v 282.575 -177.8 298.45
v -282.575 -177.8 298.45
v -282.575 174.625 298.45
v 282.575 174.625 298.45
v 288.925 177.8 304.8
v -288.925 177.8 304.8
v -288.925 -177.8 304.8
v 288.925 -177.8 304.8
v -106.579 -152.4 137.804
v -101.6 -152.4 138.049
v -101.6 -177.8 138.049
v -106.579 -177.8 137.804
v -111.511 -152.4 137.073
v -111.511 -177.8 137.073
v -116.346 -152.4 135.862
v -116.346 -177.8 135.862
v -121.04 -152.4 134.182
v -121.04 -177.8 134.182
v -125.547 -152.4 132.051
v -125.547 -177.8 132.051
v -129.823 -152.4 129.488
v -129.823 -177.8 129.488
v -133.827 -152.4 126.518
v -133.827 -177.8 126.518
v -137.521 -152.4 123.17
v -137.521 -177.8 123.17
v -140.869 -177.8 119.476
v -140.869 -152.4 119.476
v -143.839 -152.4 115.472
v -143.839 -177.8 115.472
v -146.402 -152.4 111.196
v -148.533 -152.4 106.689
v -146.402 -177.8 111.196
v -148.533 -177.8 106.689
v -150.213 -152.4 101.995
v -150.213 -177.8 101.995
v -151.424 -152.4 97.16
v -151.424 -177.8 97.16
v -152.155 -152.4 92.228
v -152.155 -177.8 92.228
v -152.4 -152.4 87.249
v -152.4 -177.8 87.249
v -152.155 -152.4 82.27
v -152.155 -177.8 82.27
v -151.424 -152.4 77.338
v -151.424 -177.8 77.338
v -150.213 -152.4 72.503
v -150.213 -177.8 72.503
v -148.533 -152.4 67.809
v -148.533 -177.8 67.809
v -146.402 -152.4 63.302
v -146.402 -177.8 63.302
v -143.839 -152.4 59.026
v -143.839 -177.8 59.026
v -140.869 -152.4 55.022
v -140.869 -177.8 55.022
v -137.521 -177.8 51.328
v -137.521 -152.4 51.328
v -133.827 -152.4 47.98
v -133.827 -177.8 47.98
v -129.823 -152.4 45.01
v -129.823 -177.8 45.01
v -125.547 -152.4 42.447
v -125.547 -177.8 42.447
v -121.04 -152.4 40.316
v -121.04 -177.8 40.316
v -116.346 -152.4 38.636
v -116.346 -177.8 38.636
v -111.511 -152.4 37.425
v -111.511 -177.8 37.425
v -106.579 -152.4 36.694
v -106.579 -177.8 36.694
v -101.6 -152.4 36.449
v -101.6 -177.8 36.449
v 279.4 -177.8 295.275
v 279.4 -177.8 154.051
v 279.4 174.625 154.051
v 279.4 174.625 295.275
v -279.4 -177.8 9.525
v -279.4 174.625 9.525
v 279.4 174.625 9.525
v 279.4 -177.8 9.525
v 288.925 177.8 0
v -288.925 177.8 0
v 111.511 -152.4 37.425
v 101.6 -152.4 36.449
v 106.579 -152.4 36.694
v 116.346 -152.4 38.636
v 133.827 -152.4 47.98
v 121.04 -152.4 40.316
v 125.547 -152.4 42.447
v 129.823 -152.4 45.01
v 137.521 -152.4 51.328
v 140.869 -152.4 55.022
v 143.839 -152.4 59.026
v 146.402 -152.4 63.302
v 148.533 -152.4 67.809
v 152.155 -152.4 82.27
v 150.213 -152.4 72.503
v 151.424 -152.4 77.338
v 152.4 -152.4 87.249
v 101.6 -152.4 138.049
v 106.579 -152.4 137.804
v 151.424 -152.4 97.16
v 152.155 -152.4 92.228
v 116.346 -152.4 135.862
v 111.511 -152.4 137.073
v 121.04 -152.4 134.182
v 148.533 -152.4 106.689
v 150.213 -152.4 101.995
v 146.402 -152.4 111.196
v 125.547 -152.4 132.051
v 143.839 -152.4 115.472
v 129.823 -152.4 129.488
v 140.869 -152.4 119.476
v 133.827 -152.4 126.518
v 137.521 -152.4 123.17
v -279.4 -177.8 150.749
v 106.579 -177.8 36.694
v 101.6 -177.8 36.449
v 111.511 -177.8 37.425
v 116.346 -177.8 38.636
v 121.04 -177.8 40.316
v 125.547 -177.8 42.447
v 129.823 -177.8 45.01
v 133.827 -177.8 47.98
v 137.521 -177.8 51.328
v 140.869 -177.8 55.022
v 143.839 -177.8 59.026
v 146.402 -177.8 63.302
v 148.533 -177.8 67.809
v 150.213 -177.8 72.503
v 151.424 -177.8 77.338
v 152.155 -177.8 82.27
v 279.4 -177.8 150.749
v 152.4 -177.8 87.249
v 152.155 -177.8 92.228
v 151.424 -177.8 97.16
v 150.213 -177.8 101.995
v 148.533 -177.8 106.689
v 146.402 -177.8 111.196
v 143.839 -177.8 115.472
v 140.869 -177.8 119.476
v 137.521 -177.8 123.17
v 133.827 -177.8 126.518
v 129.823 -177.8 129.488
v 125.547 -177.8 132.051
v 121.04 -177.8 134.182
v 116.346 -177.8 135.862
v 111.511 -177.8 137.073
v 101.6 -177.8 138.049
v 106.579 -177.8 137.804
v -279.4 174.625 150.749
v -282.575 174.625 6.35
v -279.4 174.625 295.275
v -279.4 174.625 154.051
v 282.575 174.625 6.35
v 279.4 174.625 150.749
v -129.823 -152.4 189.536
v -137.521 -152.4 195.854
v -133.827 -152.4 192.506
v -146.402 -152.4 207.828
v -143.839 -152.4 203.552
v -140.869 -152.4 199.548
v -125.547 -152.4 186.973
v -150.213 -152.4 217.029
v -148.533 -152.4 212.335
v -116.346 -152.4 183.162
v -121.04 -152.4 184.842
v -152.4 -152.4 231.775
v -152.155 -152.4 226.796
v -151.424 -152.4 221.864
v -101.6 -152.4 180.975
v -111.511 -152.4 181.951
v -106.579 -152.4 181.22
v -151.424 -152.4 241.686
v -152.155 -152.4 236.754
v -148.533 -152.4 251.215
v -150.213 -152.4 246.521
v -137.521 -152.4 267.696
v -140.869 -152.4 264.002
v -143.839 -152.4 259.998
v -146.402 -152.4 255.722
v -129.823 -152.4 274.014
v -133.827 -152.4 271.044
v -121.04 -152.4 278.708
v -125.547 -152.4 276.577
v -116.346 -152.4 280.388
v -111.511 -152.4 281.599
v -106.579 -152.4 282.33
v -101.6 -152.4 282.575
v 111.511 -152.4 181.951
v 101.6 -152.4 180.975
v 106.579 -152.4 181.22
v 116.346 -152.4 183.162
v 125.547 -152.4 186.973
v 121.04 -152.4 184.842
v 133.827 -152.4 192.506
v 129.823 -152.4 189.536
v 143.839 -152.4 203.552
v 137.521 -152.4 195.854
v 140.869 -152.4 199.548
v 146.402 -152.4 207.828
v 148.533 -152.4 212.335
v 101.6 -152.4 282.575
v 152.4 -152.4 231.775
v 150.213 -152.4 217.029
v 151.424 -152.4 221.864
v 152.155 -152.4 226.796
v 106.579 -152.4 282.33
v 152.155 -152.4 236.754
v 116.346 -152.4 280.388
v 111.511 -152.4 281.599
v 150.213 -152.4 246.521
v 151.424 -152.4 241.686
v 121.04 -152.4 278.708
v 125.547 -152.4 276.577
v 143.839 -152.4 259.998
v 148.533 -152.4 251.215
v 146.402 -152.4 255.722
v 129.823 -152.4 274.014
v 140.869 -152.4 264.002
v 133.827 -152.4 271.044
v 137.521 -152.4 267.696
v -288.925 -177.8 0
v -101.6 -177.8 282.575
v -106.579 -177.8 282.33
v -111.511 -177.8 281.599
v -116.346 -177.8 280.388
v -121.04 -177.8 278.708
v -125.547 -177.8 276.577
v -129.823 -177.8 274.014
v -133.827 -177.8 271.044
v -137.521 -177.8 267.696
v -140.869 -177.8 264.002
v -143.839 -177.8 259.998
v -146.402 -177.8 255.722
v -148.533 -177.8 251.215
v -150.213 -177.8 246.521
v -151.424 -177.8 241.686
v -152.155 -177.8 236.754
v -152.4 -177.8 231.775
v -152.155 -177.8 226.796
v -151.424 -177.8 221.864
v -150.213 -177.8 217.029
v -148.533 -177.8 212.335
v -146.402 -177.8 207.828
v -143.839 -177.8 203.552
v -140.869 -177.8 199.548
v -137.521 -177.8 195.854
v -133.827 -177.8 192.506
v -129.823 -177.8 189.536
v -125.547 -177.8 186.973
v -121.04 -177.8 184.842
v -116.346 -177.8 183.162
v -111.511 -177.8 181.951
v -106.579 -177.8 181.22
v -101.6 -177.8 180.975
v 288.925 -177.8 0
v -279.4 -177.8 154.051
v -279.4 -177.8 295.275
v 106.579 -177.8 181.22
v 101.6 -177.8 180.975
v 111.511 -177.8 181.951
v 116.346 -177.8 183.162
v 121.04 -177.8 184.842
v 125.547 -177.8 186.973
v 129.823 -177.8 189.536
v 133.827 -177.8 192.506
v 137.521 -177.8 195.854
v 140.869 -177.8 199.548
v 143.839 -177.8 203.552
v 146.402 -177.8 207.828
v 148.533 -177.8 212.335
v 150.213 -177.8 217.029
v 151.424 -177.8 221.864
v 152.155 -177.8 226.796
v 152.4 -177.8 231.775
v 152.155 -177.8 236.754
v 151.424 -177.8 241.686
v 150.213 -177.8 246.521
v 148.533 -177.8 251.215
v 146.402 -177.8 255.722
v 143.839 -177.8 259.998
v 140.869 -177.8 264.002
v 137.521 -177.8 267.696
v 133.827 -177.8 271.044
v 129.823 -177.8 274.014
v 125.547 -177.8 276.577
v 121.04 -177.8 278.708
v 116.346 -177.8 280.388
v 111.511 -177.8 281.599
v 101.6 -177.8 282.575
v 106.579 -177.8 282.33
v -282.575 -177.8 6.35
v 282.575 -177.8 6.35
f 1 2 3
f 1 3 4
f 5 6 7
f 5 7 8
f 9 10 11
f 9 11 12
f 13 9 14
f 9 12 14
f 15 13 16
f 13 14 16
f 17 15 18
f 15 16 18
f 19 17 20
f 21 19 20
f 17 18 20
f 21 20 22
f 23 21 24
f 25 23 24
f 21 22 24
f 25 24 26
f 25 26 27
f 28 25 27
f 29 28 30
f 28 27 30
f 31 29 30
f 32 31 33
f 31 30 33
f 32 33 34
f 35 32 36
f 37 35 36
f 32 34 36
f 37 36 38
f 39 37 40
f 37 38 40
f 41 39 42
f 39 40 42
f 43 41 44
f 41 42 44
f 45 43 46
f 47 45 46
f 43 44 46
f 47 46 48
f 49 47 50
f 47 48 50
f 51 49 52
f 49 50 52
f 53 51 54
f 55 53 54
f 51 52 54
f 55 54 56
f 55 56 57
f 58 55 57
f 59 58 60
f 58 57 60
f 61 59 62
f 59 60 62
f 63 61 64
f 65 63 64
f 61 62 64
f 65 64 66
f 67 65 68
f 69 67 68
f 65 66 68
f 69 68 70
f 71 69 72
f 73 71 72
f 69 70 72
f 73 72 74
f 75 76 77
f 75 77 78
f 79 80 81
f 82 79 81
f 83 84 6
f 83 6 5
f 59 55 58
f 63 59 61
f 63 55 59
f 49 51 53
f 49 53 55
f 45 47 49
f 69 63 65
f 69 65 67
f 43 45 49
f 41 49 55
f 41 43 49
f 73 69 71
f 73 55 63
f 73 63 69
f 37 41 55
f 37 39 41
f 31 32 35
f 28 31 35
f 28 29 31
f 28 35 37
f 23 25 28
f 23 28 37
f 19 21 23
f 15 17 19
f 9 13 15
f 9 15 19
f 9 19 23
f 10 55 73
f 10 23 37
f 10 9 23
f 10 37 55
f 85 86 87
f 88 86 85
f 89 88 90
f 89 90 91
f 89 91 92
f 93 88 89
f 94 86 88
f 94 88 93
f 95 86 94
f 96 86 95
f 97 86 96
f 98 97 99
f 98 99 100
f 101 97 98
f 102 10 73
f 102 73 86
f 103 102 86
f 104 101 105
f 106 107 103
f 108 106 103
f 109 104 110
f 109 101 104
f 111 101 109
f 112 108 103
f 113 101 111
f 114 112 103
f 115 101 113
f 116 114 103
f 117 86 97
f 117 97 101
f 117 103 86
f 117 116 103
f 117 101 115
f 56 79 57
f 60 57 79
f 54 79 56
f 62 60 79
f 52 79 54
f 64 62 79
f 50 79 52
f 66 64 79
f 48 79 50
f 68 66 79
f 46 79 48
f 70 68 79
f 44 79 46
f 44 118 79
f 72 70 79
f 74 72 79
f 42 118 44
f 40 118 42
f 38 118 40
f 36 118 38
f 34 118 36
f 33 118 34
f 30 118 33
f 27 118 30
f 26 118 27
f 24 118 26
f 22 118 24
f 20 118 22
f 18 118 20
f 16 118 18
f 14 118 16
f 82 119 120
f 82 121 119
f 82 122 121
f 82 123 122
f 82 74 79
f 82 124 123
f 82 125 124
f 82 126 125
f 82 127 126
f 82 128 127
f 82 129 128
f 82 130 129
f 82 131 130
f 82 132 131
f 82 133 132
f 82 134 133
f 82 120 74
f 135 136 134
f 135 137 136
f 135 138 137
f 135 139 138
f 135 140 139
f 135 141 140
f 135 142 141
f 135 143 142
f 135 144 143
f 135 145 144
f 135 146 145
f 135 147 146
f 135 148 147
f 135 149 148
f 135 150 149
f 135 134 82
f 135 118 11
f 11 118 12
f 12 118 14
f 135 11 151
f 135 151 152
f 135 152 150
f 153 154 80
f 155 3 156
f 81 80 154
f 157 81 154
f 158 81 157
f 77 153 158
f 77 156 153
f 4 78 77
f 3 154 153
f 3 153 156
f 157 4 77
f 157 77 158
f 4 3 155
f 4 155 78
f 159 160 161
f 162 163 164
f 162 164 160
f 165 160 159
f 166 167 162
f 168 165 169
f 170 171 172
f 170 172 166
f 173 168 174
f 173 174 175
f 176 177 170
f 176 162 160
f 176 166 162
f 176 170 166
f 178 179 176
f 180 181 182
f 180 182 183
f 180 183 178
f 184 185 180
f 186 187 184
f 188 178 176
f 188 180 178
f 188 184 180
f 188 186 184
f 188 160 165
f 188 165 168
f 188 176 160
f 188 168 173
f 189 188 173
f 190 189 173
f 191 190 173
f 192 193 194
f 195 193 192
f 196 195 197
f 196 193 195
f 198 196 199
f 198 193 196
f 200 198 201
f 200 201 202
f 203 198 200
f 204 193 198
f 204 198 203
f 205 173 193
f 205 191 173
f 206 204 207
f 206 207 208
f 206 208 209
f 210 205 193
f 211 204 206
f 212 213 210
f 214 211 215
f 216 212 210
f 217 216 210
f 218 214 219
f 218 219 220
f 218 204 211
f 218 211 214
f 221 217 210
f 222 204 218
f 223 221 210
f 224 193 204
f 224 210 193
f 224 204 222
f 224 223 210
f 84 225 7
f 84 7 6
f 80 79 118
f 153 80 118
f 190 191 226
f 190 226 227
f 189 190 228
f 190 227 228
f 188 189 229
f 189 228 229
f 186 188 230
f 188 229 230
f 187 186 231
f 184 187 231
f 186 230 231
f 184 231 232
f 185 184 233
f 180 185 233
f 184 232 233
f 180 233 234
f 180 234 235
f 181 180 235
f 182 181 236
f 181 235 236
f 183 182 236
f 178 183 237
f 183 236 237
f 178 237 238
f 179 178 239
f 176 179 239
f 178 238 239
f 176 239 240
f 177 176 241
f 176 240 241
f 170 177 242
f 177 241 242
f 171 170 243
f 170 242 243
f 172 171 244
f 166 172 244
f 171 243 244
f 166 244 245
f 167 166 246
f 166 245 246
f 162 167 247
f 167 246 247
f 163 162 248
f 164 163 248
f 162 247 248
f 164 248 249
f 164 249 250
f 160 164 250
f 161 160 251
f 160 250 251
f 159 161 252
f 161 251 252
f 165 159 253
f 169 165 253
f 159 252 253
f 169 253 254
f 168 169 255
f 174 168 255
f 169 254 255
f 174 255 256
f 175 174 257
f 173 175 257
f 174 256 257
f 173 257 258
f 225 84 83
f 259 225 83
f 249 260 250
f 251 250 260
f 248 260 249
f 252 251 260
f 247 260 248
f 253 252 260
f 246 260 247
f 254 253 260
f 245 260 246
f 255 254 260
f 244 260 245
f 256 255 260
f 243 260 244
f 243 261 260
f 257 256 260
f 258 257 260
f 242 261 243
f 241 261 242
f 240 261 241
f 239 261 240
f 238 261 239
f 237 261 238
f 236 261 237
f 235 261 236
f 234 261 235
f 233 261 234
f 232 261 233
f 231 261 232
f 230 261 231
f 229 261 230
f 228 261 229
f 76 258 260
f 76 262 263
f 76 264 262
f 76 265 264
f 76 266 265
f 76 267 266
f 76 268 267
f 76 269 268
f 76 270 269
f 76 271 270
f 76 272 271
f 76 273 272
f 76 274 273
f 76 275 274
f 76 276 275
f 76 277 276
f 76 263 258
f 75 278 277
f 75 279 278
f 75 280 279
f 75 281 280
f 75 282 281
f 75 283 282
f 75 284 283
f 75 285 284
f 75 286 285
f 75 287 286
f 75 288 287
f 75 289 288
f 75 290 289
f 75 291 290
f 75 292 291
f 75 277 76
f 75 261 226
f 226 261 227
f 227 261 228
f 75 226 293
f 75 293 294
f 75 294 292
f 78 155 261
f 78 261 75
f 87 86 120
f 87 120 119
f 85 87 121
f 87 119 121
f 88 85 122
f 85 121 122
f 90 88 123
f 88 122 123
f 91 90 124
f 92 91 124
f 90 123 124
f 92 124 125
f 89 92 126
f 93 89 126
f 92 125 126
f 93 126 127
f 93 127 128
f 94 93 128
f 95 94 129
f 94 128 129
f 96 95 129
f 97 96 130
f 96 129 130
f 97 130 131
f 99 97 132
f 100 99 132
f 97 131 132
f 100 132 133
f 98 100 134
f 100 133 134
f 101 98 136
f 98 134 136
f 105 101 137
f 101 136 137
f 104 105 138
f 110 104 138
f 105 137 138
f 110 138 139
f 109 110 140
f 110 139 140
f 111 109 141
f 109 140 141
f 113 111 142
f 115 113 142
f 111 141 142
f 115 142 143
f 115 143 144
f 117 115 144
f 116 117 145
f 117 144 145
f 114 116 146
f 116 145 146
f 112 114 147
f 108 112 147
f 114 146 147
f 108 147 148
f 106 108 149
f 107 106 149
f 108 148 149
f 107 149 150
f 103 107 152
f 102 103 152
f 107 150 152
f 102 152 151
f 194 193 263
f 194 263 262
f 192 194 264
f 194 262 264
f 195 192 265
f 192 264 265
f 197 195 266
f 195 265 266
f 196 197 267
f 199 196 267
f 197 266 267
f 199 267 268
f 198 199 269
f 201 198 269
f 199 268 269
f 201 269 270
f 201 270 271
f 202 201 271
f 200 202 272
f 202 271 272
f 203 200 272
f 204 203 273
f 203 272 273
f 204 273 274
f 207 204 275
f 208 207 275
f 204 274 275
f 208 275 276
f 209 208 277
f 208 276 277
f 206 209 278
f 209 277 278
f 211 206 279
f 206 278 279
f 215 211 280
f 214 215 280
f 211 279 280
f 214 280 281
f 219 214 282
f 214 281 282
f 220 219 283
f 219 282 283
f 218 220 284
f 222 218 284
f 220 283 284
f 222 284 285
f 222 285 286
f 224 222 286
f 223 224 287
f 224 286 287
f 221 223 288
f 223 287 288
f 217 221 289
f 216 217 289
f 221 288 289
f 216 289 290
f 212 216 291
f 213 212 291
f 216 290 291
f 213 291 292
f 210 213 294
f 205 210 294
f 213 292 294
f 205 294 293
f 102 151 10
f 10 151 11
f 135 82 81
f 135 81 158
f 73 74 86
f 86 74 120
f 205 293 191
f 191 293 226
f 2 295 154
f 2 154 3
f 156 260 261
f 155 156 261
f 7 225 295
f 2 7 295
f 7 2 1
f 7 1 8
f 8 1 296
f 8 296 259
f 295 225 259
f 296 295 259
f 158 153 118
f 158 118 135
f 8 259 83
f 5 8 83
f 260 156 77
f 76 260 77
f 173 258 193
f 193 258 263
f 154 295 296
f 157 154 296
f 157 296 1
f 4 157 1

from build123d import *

# Parameters (mm, degrees)
F0_W     = 577.85
F0_H     = 355.6
F1_DEPTH = 304.8
F2_W     = 565.15
F2_H     = 292.1
F3_DEPTH = 352.425
F4_W     = 558.8
F4_H     = 141.224
F5_DEPTH = 352.425
F7_DEPTH = 25.4


with BuildPart() as f1:
    # F0 (on Top) → F1 (new body)
    with BuildSketch(Plane.XY):
        Rectangle(F0_W, F0_H)
    extrude(amount=F1_DEPTH)

    # F2 (on face) → F3 (cut)
    with BuildSketch(Plane.XZ.offset(177.8)):
        with Locations((0, 152.4)):
            Rectangle(F2_W, F2_H)
    extrude(amount=-F3_DEPTH, mode=Mode.SUBTRACT)

    # F4 (on face) → F5 (join)
    with BuildSketch(Plane.XZ.offset(-174.625)):
        with Locations((0, 224.663)):
            Rectangle(F4_W, F4_H)
        with Locations((0, 80.137)):
            Rectangle(F4_W, F4_H)
    extrude(amount=F5_DEPTH)

    # F6 (on face) → F7 (cut)
    with BuildSketch(Plane.XZ.offset(177.8)):
        with BuildLine():
            Line((101.6, 138.049), (0, 138.049))
            Line((0, 138.049), (0, 36.449))
            Line((0, 36.449), (101.6, 36.449))
            ThreePointArc((101.6, 36.449), (152.4, 87.249), (101.6, 138.049))
        make_face()
        with BuildLine():
            Line((0, 36.449), (0, 138.049))
            Line((0, 138.049), (-101.6, 138.049))
            ThreePointArc((-101.6, 138.049), (-152.4, 87.249), (-101.6, 36.449))
            Line((-101.6, 36.449), (0, 36.449))
        make_face()
        with BuildLine():
            Line((0, 282.575), (-101.6, 282.575))
            ThreePointArc((-101.6, 282.575), (-152.4, 231.775), (-101.6, 180.975))
            Line((-101.6, 180.975), (0, 180.975))
            Line((0, 180.975), (0, 282.575))
        make_face()
        with BuildLine():
            Line((101.6, 282.575), (0, 282.575))
            Line((0, 282.575), (0, 180.975))
            Line((0, 180.975), (101.6, 180.975))
            ThreePointArc((101.6, 180.975), (152.4, 231.775), (101.6, 282.575))
        make_face()
    extrude(amount=-F7_DEPTH, mode=Mode.SUBTRACT)


solid = f1.part
